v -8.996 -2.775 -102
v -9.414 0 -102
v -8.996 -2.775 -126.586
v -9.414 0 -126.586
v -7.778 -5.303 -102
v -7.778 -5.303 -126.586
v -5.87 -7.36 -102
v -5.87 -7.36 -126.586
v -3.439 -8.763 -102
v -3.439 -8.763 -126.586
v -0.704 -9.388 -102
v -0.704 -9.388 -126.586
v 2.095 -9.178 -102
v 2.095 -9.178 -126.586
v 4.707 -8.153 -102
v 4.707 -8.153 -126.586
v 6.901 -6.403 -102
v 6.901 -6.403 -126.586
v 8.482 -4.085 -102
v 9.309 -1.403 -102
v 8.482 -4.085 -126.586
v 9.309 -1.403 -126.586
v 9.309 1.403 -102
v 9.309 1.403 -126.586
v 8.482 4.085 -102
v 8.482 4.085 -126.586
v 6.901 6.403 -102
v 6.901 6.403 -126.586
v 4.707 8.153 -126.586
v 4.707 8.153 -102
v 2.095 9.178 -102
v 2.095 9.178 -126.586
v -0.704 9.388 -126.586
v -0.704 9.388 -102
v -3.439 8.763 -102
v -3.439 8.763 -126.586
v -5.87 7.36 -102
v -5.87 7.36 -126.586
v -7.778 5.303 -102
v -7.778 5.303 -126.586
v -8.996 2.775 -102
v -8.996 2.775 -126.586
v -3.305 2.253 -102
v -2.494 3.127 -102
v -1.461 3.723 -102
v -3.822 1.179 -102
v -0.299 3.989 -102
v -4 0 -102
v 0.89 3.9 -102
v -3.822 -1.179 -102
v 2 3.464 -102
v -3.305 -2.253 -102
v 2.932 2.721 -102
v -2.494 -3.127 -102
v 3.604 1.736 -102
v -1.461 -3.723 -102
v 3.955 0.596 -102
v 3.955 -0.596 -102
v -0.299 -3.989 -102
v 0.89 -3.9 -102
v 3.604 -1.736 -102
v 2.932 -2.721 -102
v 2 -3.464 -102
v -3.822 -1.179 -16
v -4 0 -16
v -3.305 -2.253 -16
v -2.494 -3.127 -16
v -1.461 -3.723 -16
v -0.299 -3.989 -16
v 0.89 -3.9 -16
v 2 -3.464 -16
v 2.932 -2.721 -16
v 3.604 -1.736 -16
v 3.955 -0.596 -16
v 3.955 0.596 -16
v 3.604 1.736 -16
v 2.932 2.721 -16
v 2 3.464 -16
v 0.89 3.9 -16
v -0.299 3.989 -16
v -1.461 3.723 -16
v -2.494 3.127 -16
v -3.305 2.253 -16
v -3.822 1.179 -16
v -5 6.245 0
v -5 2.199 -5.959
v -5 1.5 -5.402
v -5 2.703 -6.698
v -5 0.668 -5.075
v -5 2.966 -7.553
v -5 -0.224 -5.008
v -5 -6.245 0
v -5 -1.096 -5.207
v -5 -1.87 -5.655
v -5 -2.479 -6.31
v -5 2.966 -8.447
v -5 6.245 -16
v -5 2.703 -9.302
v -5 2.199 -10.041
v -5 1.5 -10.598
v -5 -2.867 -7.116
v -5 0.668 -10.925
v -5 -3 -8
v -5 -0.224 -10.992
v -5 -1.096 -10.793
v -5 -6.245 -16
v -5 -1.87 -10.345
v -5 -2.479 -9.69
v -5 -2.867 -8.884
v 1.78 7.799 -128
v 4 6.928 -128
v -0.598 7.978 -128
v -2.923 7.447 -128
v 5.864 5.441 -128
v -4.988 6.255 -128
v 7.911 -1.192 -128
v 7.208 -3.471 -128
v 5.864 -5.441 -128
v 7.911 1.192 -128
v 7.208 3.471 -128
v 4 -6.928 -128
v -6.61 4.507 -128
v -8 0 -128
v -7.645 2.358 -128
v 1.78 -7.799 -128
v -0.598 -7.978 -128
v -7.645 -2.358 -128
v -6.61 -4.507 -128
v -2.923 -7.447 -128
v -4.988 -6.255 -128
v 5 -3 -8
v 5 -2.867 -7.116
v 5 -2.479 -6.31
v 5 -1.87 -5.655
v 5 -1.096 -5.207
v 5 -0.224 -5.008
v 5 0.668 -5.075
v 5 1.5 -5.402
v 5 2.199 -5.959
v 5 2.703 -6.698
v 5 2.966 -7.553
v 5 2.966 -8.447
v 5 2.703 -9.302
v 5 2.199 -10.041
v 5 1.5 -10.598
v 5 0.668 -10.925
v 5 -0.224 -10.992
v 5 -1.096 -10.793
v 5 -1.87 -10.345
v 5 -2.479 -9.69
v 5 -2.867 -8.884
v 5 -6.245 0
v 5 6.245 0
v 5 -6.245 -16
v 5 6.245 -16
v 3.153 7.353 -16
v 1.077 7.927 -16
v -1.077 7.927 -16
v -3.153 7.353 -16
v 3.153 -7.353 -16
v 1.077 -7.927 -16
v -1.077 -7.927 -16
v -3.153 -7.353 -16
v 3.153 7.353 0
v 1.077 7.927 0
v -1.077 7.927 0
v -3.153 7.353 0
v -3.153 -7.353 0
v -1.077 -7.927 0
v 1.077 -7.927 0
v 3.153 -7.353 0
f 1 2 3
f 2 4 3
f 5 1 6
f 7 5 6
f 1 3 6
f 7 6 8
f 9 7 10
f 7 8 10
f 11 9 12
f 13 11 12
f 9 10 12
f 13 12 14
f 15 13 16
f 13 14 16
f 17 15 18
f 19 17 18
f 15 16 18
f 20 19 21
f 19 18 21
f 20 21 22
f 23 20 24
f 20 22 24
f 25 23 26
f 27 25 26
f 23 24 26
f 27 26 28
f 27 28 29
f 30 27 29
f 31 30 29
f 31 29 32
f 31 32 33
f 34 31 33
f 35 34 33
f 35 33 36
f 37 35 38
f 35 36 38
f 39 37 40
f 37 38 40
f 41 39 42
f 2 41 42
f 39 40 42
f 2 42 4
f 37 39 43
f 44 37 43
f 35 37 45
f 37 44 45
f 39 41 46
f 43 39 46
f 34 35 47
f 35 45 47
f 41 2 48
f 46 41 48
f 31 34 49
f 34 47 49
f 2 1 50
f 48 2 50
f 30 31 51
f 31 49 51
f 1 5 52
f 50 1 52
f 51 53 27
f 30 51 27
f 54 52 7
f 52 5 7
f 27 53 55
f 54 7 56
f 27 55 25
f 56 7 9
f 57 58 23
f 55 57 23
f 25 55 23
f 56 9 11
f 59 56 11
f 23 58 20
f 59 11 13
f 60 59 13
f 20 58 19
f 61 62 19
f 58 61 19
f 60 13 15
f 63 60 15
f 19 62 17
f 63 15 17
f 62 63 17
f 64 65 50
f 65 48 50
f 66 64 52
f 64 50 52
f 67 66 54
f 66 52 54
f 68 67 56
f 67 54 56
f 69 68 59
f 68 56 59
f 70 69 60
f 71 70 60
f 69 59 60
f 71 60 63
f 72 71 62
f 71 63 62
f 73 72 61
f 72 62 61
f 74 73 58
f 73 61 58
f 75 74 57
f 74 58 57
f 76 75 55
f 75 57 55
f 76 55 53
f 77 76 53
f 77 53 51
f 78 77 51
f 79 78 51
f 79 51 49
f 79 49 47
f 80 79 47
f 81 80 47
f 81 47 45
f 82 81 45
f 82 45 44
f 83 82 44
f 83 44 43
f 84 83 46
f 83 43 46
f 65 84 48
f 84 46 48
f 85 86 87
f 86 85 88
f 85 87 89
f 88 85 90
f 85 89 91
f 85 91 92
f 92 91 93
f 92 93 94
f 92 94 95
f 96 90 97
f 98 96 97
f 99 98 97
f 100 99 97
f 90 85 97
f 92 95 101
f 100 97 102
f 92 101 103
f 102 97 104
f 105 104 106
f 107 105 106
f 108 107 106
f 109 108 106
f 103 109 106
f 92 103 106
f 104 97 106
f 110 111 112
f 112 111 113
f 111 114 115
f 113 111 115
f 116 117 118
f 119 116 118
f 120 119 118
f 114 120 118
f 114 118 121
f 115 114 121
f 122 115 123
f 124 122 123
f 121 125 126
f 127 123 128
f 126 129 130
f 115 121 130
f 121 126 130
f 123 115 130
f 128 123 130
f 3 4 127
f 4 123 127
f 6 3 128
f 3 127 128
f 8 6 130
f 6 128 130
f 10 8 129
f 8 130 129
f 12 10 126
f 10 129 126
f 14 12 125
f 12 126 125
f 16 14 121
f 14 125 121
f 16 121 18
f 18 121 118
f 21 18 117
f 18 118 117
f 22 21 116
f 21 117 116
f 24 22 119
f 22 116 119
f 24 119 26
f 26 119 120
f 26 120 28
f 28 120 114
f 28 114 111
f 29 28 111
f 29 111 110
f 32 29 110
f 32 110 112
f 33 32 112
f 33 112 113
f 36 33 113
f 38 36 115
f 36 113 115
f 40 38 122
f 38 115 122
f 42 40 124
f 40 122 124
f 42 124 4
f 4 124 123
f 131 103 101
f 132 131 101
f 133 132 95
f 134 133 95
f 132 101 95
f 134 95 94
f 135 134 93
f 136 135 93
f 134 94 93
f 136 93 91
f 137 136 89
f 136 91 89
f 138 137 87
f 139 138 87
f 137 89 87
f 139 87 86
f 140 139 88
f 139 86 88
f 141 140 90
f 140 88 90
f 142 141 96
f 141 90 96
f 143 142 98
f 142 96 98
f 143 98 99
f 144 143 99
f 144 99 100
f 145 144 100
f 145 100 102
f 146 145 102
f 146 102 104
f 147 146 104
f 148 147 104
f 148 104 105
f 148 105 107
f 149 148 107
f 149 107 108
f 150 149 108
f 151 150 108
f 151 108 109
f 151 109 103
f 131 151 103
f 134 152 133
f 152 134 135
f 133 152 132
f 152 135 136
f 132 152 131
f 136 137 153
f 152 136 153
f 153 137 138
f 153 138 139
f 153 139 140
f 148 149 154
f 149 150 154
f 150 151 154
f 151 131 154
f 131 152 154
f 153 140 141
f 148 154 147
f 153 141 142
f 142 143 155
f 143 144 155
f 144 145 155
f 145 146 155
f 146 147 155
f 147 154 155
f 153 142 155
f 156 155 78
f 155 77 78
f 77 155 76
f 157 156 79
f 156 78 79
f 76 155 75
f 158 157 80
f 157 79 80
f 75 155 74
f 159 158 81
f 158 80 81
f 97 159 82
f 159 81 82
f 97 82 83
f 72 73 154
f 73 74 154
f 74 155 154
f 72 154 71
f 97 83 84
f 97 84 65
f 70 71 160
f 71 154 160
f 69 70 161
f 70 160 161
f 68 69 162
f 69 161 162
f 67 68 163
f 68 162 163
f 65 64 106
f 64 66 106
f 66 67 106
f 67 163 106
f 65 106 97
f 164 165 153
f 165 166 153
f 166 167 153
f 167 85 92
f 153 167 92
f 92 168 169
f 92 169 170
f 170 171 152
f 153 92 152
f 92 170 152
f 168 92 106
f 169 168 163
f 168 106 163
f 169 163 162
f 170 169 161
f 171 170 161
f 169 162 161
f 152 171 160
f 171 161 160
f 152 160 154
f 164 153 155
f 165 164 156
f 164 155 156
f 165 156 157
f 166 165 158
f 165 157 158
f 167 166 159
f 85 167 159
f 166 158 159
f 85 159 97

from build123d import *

# Parameters (mm, degrees)
ENL_V_START             = -16
ENL_V_MAT_EXTRU_1_DEPTH = 16
ENL_V_MAT_EXTRU_2_REACH = 131.153
ESQUISSE3_R             = 3


with BuildPart() as part:
    # Esquisse1 → Révolution1 (revolve)
    with BuildSketch(Plane(origin=(0, 0, 0), x_dir=(1, 0, 0), z_dir=(0, 1, 0))):
        Polygon((0, 0), (-8, 0), (-8, 16), (-4, 16), (-4, 102), (-9.414213562, 102), (-9.414213562, 126.585786438), (-8, 128), (0, 128), align=None)
    revolve(axis=Axis((0, 0, -128), (0, 0, 1)))

    # Esquisse2 → Enlèv. mat.-Extru.1 (cut)
    with BuildSketch(Plane.XY.offset(ENL_V_START)):
        Polygon((-5, 10), (-5, -12), (5, -12), (5, 10), (12, 10), (12, -15), (-12, -15), (-12, 10), align=None)
    extrude(amount=ENL_V_MAT_EXTRU_1_DEPTH, mode=Mode.SUBTRACT)

    # Esquisse3 → Enlèv. mat.-Extru.2 (cut, up to next)
    with BuildSketch(Plane.ZY.offset(5), mode=Mode.PRIVATE) as enl_v_mat_extru_2_sk1:
        with Locations(Location((-8, 0, 0), (0, 0, 270))):
            Circle(ESQUISSE3_R)
    enl_v_mat_extru_2_tool1 = extrude(enl_v_mat_extru_2_sk1.sketch, amount=-ENL_V_MAT_EXTRU_2_REACH, mode=Mode.PRIVATE) & part.part
    add(enl_v_mat_extru_2_tool1.solids().sort_by_distance((-5, 0, -8))[0], mode=Mode.SUBTRACT)


solid = part.part
